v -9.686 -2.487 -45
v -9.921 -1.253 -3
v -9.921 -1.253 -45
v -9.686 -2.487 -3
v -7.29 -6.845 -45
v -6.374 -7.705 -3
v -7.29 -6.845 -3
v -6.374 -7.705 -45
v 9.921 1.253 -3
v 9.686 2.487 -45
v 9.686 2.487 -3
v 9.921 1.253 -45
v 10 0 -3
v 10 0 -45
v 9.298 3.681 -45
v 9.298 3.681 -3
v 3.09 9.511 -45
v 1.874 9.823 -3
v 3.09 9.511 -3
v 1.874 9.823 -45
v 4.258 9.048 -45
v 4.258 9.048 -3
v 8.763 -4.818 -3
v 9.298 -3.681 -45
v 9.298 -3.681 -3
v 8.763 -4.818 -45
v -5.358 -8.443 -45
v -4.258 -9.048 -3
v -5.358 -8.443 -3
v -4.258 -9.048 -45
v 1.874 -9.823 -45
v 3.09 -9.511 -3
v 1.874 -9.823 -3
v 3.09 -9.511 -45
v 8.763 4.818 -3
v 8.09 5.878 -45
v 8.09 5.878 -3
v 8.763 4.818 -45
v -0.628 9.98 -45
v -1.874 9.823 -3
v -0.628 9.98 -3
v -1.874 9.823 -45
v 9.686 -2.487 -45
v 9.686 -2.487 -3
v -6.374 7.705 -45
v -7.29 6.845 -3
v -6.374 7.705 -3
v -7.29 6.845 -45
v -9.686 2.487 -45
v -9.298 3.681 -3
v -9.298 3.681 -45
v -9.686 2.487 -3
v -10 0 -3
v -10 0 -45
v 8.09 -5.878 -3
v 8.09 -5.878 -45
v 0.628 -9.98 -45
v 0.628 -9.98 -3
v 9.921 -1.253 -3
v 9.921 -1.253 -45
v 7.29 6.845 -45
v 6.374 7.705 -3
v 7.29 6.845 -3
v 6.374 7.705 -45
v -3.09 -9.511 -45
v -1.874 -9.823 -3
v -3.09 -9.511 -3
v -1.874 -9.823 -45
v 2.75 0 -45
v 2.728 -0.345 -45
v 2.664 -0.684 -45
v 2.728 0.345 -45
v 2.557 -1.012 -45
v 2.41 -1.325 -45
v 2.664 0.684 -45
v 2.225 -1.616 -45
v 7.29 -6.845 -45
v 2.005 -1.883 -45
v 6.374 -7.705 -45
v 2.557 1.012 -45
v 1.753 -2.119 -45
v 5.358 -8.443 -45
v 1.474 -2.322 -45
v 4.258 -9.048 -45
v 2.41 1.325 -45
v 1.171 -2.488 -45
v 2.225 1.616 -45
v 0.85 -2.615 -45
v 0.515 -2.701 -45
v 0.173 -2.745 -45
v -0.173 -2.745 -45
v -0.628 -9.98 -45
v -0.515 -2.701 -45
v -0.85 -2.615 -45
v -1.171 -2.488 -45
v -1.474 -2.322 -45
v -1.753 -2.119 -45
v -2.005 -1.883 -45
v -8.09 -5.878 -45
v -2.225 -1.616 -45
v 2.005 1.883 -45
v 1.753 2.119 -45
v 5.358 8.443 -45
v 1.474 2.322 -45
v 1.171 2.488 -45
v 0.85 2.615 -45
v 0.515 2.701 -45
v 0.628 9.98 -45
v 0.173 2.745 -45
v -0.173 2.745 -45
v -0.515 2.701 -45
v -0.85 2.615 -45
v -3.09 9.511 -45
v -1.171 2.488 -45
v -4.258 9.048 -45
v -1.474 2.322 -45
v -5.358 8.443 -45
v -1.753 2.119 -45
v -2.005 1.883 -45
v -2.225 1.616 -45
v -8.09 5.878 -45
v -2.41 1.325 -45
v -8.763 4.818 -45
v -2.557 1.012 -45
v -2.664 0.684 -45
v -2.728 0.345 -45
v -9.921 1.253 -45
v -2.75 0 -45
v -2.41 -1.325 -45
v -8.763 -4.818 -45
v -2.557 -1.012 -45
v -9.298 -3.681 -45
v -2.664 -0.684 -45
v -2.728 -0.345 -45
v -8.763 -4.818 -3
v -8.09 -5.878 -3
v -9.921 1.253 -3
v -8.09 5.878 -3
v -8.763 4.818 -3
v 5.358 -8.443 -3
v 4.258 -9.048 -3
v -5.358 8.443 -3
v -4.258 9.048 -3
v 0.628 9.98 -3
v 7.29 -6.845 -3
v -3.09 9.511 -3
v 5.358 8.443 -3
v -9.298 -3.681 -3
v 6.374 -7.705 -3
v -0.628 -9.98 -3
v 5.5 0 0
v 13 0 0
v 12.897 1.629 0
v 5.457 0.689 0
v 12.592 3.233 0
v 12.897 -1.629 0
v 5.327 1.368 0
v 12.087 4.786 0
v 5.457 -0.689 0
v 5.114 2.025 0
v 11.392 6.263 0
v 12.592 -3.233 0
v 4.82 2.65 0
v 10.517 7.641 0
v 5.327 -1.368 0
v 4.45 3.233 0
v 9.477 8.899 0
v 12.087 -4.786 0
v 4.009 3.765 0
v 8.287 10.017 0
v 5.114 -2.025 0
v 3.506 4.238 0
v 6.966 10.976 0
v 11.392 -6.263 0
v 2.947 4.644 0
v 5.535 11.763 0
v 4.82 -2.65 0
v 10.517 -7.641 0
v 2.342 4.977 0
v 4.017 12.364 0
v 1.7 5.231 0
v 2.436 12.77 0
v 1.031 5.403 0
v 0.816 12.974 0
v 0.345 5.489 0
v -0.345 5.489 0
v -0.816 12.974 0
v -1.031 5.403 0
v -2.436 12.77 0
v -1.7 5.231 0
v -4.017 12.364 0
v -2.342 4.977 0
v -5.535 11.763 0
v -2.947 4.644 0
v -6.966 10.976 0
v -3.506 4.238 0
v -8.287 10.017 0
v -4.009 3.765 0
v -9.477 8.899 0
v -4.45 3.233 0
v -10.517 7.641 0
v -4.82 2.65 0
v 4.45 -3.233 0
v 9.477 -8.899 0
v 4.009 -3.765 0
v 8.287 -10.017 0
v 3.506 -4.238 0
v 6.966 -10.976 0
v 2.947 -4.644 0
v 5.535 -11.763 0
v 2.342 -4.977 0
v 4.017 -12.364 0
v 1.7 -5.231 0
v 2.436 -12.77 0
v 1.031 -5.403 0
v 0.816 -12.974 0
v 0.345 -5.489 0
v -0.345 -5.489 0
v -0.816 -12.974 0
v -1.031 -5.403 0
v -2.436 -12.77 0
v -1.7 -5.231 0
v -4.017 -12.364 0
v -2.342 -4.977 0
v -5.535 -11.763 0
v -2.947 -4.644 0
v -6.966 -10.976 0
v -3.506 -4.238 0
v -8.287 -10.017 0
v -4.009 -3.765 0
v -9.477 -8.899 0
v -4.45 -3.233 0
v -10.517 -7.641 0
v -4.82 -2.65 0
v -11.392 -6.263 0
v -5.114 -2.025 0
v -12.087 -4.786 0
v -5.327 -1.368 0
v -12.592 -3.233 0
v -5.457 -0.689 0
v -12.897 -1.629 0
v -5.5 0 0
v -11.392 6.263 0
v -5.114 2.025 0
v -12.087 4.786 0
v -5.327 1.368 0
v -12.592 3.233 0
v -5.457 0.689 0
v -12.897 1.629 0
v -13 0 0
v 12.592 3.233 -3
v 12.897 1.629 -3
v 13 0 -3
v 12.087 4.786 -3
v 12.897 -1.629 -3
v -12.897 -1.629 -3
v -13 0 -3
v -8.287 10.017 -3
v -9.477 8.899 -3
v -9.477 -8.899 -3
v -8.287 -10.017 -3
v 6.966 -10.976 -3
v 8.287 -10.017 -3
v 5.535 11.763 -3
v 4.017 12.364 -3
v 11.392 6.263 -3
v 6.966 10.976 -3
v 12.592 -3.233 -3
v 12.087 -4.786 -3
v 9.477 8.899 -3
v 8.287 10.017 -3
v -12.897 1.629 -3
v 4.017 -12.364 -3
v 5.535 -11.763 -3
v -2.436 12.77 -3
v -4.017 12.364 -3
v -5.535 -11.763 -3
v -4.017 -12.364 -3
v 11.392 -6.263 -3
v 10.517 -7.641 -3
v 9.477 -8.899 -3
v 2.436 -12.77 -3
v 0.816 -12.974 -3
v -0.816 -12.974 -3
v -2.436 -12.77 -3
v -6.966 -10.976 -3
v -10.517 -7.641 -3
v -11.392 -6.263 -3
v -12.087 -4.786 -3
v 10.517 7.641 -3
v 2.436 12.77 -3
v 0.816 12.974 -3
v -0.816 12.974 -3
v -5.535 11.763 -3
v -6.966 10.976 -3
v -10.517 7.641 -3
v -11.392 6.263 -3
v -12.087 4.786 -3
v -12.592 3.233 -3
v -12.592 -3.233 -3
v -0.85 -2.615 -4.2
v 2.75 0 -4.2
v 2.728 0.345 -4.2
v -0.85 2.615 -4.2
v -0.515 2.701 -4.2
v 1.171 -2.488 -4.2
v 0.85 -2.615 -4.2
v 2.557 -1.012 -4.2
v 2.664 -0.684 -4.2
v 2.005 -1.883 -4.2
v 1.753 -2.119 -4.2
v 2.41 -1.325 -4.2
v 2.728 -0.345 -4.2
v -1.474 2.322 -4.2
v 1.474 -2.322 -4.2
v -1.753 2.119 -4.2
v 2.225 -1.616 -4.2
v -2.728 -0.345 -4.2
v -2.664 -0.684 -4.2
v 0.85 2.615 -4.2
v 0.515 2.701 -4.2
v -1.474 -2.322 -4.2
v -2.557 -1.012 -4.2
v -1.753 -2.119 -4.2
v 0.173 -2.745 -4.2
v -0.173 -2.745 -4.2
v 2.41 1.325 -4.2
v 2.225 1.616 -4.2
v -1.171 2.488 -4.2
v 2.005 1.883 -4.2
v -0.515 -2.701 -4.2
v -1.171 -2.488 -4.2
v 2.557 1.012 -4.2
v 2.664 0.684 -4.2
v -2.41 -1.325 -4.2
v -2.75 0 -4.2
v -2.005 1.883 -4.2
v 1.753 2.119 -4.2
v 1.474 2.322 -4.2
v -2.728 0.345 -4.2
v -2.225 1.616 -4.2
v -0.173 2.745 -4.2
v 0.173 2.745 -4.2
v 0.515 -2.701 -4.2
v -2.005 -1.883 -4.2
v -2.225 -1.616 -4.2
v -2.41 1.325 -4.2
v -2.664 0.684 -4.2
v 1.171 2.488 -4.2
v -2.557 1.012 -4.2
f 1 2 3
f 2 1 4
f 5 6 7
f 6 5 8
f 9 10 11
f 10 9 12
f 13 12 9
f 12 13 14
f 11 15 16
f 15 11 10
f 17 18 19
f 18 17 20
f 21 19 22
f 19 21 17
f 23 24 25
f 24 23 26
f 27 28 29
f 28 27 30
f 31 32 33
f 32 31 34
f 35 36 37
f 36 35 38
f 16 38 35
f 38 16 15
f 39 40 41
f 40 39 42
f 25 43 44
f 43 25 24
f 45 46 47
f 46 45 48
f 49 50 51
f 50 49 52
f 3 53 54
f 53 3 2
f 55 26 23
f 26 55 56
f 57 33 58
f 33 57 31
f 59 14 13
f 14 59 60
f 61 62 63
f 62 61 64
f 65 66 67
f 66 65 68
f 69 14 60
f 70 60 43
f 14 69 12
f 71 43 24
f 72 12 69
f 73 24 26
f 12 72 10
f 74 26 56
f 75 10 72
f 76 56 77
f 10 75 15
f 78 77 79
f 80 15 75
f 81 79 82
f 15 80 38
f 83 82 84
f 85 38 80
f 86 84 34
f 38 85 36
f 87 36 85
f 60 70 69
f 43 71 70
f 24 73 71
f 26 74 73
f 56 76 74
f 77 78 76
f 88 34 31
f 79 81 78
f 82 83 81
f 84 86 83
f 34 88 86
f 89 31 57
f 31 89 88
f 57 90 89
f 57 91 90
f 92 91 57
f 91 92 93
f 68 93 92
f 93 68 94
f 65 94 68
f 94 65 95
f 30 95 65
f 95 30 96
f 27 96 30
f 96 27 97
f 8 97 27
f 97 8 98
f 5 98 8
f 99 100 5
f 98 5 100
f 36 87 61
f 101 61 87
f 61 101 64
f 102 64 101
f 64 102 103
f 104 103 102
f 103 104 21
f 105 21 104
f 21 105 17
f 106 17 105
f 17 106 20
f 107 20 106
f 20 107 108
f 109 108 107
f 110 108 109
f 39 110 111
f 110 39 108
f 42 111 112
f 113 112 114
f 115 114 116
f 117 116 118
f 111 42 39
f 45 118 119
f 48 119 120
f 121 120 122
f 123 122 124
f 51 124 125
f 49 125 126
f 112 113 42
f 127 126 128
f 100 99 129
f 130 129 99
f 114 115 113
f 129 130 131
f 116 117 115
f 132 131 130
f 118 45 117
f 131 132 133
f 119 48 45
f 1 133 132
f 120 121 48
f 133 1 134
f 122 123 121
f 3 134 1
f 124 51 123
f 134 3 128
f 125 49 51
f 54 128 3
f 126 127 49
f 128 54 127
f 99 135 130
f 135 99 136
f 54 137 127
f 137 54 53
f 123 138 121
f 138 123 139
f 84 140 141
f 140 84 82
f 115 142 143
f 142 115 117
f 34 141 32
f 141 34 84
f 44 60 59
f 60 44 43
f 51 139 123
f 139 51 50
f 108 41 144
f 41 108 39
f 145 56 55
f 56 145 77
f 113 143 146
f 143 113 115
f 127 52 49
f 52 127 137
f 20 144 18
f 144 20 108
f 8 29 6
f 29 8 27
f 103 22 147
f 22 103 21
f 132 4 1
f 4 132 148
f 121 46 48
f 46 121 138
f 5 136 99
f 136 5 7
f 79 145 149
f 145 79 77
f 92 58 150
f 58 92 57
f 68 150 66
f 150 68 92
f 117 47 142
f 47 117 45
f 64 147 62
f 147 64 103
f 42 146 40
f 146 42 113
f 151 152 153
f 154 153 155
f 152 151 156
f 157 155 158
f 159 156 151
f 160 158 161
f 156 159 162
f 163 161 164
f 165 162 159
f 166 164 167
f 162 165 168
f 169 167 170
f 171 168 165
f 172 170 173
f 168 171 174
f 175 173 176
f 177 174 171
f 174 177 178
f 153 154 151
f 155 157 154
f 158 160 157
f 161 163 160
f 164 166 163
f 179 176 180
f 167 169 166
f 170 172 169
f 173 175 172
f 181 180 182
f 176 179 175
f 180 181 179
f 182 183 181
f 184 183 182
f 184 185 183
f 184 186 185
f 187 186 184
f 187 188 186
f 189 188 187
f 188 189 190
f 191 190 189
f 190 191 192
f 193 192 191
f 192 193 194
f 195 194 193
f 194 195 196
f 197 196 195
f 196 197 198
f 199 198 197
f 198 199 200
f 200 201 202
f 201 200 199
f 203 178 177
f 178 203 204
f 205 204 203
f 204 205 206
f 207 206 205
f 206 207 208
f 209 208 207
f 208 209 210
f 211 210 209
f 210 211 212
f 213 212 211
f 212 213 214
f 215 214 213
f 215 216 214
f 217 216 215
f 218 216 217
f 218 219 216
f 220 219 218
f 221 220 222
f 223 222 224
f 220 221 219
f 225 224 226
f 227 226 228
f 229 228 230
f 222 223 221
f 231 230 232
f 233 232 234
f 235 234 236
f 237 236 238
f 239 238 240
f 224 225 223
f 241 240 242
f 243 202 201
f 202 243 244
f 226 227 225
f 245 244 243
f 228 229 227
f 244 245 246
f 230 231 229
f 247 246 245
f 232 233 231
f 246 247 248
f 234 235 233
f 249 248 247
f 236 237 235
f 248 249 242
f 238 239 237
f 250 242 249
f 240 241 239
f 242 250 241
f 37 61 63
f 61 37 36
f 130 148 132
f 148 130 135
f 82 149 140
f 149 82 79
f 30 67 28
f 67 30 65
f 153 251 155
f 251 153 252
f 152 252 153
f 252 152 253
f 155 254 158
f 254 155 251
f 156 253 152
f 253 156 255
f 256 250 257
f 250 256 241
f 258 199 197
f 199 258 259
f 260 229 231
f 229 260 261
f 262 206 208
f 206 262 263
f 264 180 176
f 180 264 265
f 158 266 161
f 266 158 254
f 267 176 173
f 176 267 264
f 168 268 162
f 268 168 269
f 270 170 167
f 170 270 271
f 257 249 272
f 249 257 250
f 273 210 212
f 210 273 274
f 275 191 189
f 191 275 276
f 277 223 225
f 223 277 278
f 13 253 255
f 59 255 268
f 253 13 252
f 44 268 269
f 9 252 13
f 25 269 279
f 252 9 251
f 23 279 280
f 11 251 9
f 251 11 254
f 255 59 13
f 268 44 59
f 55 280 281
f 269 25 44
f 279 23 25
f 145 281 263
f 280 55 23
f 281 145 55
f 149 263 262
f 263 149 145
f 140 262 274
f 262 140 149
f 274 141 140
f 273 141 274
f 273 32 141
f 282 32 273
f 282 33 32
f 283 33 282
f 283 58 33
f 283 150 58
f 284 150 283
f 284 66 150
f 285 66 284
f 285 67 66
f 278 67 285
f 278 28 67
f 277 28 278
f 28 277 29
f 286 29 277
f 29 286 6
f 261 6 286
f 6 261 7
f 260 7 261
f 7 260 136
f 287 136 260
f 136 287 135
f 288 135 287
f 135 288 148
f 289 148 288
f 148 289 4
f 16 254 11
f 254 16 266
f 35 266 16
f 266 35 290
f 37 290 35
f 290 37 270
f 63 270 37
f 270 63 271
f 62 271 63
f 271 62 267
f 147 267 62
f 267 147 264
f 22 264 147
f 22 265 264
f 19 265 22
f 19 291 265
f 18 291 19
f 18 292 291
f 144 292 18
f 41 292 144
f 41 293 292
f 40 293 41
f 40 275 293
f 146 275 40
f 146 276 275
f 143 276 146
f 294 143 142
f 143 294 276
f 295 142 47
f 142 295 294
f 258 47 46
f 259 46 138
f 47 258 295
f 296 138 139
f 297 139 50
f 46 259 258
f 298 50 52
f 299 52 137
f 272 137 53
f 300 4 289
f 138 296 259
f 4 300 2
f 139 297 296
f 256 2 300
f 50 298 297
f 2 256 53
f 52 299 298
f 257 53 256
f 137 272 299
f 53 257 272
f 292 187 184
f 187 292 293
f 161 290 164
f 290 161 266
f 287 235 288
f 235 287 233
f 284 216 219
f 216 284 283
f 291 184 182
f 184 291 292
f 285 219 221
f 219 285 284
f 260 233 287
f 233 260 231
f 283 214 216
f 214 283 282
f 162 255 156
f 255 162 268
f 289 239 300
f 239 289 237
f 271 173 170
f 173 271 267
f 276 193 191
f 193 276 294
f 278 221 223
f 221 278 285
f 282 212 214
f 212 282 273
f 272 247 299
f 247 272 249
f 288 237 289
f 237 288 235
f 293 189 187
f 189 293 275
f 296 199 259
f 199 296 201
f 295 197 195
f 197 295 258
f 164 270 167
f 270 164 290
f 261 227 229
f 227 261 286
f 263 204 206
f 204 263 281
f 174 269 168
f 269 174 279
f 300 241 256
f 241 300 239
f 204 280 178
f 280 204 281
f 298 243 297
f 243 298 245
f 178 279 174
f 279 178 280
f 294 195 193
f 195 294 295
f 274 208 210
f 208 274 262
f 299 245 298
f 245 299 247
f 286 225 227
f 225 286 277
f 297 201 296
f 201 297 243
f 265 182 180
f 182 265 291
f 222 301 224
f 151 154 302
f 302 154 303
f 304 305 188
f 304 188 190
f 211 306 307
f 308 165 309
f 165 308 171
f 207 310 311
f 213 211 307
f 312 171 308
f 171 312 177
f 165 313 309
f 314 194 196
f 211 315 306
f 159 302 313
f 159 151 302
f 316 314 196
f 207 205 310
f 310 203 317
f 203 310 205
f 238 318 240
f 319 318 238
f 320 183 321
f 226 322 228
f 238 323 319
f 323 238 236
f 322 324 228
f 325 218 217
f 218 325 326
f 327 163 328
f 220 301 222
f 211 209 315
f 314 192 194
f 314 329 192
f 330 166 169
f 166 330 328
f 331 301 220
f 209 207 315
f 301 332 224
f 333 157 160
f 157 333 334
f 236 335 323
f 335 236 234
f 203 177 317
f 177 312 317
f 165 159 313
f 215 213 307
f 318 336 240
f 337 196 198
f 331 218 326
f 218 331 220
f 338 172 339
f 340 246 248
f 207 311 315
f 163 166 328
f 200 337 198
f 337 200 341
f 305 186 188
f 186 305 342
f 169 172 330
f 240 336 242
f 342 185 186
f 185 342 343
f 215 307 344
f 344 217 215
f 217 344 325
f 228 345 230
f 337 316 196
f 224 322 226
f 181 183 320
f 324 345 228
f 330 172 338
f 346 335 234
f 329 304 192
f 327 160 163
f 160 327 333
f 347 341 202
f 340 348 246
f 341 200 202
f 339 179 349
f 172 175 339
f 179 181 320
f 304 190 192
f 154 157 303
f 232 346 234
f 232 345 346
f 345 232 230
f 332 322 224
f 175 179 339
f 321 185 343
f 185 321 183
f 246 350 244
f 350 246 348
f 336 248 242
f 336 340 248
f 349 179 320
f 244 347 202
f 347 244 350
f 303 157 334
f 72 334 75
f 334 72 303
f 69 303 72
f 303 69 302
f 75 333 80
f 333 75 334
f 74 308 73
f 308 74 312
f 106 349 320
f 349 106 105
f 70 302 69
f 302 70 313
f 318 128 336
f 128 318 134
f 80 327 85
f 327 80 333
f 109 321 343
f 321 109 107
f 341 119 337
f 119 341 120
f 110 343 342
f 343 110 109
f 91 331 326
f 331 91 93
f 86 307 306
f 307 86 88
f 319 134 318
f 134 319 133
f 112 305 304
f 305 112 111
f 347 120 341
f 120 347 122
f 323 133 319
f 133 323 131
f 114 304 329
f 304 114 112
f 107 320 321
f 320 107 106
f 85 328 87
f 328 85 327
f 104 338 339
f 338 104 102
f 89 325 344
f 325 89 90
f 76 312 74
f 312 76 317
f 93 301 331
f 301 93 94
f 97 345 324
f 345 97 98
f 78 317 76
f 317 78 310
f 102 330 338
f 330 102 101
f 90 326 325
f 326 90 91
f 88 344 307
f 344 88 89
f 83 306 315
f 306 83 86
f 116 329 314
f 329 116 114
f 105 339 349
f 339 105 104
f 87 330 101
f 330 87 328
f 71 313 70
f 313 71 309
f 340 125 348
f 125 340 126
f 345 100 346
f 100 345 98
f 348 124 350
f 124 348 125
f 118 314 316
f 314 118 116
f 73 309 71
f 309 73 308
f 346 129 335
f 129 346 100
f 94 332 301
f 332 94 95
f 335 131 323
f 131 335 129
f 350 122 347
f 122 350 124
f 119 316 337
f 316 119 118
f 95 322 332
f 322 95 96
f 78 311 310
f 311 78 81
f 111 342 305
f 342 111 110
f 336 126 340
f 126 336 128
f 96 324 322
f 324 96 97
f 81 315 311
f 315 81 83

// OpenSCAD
$fn = 50;


difference() {
	union() {
		translate(v = [0, 0, -45.0000000000]) {
			cylinder(h = 45, r = 10.0000000000);
		}
		translate(v = [0, 0, -3.0000000000]) {
			cylinder(h = 3, r = 13.0000000000);
		}
	}
	union() {
		translate(v = [0, 0, 0]) {
			rotate(a = [0, 0, 0]) {
				difference() {
					union() {
						#translate(v = [0, 0, -45.0000000000]) {
							cylinder(h = 45, r = 2.2500000000);
						}
						#translate(v = [0, 0, -4.2000000000]) {
							cylinder(h = 4.2000000000, r = 10.0000000000, r1 = 2.7500000000, r2 = 5.5000000000);
						}
						#translate(v = [0, 0, -45.0000000000]) {
							cylinder(h = 45, r = 2.7500000000);
						}
						#translate(v = [0, 0, -45.0000000000]) {
							cylinder(h = 45, r = 2.2500000000);
						}
					}
					union();
				}
			}
		}
	}
}
